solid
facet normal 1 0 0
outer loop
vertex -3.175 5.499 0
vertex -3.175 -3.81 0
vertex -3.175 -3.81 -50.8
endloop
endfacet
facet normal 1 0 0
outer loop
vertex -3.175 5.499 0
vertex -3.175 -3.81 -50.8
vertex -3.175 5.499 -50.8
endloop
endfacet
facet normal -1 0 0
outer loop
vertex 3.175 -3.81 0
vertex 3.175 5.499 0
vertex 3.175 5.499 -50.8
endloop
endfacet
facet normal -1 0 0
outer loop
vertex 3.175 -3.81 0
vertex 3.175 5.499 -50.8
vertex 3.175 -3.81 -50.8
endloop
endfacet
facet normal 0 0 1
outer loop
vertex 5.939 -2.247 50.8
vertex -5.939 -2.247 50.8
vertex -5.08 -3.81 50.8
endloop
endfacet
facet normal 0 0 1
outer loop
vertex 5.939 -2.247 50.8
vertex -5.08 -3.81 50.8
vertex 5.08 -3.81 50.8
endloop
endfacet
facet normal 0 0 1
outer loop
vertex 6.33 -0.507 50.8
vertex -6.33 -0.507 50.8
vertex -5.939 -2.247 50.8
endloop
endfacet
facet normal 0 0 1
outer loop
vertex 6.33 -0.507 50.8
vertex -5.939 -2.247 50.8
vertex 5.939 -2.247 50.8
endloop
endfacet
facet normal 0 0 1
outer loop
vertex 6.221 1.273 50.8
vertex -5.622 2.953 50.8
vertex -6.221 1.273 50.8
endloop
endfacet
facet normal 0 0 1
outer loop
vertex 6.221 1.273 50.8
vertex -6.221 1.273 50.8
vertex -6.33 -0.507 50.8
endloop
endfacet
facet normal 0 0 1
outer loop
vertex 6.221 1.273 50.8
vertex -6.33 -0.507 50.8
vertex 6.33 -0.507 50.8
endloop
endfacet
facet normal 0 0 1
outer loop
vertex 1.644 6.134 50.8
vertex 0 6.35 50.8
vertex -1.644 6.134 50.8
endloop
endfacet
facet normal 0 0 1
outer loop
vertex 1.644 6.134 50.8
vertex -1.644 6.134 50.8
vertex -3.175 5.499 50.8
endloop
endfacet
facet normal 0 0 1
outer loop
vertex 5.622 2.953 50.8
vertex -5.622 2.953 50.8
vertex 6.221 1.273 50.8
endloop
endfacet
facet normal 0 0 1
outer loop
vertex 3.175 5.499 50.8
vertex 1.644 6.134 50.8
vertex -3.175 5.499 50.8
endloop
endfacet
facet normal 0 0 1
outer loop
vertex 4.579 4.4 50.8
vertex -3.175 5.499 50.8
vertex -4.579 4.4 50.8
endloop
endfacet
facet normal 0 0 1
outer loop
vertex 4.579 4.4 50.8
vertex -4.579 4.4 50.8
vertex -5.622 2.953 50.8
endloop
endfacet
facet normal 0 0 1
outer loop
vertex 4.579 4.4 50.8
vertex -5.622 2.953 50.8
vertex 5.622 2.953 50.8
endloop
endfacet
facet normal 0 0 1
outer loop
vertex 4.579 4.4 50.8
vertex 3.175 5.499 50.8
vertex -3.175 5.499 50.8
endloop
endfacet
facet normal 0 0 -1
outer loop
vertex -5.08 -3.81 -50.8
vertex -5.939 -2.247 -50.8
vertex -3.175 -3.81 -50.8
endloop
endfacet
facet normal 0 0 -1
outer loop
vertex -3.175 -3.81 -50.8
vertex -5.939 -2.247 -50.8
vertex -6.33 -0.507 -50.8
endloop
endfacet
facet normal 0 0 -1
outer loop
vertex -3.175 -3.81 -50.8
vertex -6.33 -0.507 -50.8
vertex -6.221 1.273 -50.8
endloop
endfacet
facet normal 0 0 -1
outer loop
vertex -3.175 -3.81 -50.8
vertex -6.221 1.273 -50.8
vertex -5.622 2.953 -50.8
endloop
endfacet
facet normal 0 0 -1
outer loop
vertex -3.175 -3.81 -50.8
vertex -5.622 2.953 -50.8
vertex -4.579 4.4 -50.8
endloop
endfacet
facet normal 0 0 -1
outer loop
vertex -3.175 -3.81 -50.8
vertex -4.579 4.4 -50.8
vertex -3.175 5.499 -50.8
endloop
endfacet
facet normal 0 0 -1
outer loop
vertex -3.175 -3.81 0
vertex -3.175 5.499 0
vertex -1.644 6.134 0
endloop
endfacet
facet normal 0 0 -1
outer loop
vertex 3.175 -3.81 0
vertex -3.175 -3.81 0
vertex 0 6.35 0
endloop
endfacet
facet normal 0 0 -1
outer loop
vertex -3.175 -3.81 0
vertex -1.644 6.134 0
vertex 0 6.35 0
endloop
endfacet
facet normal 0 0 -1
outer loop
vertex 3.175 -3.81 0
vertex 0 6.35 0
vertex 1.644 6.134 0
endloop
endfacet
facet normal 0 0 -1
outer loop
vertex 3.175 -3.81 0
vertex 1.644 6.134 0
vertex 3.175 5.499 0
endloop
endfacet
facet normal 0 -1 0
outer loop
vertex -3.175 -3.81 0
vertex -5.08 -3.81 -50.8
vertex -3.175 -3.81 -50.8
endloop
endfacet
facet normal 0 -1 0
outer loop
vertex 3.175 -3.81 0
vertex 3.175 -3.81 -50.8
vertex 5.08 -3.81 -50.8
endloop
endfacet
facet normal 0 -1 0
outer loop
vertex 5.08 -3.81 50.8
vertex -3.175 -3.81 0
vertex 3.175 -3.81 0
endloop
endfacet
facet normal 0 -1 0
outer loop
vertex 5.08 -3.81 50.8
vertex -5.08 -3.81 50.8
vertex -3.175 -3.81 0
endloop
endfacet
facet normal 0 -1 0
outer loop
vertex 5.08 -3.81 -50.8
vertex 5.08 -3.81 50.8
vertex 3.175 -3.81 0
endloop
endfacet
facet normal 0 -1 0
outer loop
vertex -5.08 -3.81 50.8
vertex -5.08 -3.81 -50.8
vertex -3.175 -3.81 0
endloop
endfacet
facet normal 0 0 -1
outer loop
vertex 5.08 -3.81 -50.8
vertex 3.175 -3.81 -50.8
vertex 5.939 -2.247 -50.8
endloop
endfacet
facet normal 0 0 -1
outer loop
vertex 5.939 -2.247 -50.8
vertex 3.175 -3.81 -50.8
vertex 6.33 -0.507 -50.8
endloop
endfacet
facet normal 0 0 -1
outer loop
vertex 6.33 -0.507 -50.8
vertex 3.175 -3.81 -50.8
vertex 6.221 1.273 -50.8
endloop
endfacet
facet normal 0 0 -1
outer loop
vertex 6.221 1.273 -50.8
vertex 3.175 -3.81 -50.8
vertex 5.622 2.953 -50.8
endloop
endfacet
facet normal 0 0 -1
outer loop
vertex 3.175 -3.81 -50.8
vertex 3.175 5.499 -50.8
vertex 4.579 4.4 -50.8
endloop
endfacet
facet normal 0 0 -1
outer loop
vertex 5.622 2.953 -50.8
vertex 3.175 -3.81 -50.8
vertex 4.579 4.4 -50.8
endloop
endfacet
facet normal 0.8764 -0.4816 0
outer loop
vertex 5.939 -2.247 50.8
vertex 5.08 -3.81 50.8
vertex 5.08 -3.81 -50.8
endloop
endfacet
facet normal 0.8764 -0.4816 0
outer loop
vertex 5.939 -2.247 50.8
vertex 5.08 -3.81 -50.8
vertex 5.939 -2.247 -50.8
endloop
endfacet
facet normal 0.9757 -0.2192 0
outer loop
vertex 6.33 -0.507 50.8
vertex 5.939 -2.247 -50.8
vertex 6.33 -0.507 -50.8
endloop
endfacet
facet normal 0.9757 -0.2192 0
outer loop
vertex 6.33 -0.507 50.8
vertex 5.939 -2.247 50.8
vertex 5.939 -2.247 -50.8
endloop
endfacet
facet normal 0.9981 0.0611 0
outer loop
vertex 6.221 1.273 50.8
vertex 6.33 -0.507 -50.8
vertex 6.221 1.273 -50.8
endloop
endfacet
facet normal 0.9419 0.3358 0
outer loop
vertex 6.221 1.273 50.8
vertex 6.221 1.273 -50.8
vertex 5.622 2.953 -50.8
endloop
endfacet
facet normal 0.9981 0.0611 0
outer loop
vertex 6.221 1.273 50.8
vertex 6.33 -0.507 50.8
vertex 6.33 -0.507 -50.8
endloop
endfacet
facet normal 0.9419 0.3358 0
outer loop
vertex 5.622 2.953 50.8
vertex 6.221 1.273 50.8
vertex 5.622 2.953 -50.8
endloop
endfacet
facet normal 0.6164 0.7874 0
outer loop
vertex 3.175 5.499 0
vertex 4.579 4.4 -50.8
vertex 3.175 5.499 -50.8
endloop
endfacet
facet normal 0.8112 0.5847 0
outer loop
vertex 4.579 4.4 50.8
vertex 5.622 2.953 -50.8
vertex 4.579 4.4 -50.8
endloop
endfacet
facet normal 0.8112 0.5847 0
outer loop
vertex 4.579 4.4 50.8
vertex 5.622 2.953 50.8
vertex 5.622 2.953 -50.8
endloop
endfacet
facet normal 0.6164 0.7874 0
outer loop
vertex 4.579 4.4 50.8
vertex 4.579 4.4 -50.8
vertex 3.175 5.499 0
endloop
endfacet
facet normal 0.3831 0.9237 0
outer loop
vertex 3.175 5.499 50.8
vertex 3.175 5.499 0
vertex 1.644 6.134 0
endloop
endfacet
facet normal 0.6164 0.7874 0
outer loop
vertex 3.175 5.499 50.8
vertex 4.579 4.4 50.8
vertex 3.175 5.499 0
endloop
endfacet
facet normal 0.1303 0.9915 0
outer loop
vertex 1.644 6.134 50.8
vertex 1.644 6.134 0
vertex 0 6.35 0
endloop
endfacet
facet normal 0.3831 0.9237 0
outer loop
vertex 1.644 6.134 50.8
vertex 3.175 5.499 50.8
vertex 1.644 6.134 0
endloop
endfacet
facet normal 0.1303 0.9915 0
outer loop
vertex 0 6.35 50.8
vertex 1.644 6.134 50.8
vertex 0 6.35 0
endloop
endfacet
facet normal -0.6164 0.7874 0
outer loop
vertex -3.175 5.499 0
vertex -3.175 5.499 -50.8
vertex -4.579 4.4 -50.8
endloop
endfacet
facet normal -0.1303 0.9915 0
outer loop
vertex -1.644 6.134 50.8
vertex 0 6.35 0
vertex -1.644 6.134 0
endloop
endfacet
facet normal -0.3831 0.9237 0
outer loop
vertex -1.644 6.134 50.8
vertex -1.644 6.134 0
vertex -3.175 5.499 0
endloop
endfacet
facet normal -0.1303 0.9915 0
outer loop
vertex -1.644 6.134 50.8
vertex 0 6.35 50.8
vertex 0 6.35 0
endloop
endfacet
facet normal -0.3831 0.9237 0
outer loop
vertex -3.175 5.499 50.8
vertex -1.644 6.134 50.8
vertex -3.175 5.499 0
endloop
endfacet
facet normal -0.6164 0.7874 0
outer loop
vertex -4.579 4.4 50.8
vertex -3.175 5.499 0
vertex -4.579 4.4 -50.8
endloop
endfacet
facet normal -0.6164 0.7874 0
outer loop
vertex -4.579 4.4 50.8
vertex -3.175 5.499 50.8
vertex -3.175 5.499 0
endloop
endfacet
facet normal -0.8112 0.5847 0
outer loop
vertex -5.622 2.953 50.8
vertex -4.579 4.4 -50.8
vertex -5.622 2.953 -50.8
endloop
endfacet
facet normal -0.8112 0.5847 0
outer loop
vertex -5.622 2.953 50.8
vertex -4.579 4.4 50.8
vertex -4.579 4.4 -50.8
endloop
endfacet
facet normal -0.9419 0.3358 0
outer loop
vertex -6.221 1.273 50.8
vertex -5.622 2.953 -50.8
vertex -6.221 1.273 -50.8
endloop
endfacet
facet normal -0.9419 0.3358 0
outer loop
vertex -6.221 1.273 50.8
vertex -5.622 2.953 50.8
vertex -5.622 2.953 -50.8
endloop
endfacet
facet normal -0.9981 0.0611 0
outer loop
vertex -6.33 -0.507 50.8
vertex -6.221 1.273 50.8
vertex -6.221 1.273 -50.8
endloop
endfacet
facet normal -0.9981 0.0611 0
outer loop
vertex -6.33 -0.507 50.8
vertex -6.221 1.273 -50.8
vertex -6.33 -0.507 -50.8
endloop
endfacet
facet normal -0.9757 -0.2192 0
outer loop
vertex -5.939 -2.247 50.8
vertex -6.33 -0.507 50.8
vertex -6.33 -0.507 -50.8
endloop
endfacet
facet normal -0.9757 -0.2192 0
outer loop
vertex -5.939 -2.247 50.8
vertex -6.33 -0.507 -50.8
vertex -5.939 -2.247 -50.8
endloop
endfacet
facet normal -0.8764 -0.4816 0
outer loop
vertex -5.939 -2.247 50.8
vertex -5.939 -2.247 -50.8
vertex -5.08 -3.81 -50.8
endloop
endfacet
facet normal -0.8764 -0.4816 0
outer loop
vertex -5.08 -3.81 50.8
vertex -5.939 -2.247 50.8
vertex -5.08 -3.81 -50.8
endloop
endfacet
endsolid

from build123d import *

# Parameters (mm, degrees)
F1_DEPTH = 50.8
F2_DEPTH = 50.8


with BuildPart() as f1:
    # F0 (on Top) → F1 (new body)
    with BuildSketch(Plane.XY):
        with BuildLine():
            Line((-3.175, -3.81), (-3.175, 5.499261314))
            ThreePointArc((-3.175, 5.499261314), (-6.2210805173, 1.2730503512), (-5.08, -3.81))
            Line((-5.08, -3.81), (-3.175, -3.81))
        make_face()
        with BuildLine():
            Line((3.175, -3.81), (3.175, 5.499261314))
            ThreePointArc((3.175, 5.499261314), (0, 6.35), (-3.175, 5.499261314))
            Line((-3.175, 5.499261314), (-3.175, -3.81))
            Line((-3.175, -3.81), (3.175, -3.81))
        make_face()
        with BuildLine():
            Line((3.175, -3.81), (5.08, -3.81))
            ThreePointArc((5.08, -3.81), (6.2210805173, 1.2730503512), (3.175, 5.499261314))
            Line((3.175, 5.499261314), (3.175, -3.81))
        make_face()
    extrude(amount=F1_DEPTH)

    # F0 (on Top) → F2 (join)
    with BuildSketch(Plane.XY):
        with BuildLine():
            Line((3.175, -3.81), (5.08, -3.81))
            ThreePointArc((5.08, -3.81), (6.2210805173, 1.2730503512), (3.175, 5.499261314))
            Line((3.175, 5.499261314), (3.175, -3.81))
        make_face()
        with BuildLine():
            Line((-3.175, -3.81), (-3.175, 5.499261314))
            ThreePointArc((-3.175, 5.499261314), (-6.2210805173, 1.2730503512), (-5.08, -3.81))
            Line((-5.08, -3.81), (-3.175, -3.81))
        make_face()
    extrude(amount=-F2_DEPTH)


solid = f1.part
